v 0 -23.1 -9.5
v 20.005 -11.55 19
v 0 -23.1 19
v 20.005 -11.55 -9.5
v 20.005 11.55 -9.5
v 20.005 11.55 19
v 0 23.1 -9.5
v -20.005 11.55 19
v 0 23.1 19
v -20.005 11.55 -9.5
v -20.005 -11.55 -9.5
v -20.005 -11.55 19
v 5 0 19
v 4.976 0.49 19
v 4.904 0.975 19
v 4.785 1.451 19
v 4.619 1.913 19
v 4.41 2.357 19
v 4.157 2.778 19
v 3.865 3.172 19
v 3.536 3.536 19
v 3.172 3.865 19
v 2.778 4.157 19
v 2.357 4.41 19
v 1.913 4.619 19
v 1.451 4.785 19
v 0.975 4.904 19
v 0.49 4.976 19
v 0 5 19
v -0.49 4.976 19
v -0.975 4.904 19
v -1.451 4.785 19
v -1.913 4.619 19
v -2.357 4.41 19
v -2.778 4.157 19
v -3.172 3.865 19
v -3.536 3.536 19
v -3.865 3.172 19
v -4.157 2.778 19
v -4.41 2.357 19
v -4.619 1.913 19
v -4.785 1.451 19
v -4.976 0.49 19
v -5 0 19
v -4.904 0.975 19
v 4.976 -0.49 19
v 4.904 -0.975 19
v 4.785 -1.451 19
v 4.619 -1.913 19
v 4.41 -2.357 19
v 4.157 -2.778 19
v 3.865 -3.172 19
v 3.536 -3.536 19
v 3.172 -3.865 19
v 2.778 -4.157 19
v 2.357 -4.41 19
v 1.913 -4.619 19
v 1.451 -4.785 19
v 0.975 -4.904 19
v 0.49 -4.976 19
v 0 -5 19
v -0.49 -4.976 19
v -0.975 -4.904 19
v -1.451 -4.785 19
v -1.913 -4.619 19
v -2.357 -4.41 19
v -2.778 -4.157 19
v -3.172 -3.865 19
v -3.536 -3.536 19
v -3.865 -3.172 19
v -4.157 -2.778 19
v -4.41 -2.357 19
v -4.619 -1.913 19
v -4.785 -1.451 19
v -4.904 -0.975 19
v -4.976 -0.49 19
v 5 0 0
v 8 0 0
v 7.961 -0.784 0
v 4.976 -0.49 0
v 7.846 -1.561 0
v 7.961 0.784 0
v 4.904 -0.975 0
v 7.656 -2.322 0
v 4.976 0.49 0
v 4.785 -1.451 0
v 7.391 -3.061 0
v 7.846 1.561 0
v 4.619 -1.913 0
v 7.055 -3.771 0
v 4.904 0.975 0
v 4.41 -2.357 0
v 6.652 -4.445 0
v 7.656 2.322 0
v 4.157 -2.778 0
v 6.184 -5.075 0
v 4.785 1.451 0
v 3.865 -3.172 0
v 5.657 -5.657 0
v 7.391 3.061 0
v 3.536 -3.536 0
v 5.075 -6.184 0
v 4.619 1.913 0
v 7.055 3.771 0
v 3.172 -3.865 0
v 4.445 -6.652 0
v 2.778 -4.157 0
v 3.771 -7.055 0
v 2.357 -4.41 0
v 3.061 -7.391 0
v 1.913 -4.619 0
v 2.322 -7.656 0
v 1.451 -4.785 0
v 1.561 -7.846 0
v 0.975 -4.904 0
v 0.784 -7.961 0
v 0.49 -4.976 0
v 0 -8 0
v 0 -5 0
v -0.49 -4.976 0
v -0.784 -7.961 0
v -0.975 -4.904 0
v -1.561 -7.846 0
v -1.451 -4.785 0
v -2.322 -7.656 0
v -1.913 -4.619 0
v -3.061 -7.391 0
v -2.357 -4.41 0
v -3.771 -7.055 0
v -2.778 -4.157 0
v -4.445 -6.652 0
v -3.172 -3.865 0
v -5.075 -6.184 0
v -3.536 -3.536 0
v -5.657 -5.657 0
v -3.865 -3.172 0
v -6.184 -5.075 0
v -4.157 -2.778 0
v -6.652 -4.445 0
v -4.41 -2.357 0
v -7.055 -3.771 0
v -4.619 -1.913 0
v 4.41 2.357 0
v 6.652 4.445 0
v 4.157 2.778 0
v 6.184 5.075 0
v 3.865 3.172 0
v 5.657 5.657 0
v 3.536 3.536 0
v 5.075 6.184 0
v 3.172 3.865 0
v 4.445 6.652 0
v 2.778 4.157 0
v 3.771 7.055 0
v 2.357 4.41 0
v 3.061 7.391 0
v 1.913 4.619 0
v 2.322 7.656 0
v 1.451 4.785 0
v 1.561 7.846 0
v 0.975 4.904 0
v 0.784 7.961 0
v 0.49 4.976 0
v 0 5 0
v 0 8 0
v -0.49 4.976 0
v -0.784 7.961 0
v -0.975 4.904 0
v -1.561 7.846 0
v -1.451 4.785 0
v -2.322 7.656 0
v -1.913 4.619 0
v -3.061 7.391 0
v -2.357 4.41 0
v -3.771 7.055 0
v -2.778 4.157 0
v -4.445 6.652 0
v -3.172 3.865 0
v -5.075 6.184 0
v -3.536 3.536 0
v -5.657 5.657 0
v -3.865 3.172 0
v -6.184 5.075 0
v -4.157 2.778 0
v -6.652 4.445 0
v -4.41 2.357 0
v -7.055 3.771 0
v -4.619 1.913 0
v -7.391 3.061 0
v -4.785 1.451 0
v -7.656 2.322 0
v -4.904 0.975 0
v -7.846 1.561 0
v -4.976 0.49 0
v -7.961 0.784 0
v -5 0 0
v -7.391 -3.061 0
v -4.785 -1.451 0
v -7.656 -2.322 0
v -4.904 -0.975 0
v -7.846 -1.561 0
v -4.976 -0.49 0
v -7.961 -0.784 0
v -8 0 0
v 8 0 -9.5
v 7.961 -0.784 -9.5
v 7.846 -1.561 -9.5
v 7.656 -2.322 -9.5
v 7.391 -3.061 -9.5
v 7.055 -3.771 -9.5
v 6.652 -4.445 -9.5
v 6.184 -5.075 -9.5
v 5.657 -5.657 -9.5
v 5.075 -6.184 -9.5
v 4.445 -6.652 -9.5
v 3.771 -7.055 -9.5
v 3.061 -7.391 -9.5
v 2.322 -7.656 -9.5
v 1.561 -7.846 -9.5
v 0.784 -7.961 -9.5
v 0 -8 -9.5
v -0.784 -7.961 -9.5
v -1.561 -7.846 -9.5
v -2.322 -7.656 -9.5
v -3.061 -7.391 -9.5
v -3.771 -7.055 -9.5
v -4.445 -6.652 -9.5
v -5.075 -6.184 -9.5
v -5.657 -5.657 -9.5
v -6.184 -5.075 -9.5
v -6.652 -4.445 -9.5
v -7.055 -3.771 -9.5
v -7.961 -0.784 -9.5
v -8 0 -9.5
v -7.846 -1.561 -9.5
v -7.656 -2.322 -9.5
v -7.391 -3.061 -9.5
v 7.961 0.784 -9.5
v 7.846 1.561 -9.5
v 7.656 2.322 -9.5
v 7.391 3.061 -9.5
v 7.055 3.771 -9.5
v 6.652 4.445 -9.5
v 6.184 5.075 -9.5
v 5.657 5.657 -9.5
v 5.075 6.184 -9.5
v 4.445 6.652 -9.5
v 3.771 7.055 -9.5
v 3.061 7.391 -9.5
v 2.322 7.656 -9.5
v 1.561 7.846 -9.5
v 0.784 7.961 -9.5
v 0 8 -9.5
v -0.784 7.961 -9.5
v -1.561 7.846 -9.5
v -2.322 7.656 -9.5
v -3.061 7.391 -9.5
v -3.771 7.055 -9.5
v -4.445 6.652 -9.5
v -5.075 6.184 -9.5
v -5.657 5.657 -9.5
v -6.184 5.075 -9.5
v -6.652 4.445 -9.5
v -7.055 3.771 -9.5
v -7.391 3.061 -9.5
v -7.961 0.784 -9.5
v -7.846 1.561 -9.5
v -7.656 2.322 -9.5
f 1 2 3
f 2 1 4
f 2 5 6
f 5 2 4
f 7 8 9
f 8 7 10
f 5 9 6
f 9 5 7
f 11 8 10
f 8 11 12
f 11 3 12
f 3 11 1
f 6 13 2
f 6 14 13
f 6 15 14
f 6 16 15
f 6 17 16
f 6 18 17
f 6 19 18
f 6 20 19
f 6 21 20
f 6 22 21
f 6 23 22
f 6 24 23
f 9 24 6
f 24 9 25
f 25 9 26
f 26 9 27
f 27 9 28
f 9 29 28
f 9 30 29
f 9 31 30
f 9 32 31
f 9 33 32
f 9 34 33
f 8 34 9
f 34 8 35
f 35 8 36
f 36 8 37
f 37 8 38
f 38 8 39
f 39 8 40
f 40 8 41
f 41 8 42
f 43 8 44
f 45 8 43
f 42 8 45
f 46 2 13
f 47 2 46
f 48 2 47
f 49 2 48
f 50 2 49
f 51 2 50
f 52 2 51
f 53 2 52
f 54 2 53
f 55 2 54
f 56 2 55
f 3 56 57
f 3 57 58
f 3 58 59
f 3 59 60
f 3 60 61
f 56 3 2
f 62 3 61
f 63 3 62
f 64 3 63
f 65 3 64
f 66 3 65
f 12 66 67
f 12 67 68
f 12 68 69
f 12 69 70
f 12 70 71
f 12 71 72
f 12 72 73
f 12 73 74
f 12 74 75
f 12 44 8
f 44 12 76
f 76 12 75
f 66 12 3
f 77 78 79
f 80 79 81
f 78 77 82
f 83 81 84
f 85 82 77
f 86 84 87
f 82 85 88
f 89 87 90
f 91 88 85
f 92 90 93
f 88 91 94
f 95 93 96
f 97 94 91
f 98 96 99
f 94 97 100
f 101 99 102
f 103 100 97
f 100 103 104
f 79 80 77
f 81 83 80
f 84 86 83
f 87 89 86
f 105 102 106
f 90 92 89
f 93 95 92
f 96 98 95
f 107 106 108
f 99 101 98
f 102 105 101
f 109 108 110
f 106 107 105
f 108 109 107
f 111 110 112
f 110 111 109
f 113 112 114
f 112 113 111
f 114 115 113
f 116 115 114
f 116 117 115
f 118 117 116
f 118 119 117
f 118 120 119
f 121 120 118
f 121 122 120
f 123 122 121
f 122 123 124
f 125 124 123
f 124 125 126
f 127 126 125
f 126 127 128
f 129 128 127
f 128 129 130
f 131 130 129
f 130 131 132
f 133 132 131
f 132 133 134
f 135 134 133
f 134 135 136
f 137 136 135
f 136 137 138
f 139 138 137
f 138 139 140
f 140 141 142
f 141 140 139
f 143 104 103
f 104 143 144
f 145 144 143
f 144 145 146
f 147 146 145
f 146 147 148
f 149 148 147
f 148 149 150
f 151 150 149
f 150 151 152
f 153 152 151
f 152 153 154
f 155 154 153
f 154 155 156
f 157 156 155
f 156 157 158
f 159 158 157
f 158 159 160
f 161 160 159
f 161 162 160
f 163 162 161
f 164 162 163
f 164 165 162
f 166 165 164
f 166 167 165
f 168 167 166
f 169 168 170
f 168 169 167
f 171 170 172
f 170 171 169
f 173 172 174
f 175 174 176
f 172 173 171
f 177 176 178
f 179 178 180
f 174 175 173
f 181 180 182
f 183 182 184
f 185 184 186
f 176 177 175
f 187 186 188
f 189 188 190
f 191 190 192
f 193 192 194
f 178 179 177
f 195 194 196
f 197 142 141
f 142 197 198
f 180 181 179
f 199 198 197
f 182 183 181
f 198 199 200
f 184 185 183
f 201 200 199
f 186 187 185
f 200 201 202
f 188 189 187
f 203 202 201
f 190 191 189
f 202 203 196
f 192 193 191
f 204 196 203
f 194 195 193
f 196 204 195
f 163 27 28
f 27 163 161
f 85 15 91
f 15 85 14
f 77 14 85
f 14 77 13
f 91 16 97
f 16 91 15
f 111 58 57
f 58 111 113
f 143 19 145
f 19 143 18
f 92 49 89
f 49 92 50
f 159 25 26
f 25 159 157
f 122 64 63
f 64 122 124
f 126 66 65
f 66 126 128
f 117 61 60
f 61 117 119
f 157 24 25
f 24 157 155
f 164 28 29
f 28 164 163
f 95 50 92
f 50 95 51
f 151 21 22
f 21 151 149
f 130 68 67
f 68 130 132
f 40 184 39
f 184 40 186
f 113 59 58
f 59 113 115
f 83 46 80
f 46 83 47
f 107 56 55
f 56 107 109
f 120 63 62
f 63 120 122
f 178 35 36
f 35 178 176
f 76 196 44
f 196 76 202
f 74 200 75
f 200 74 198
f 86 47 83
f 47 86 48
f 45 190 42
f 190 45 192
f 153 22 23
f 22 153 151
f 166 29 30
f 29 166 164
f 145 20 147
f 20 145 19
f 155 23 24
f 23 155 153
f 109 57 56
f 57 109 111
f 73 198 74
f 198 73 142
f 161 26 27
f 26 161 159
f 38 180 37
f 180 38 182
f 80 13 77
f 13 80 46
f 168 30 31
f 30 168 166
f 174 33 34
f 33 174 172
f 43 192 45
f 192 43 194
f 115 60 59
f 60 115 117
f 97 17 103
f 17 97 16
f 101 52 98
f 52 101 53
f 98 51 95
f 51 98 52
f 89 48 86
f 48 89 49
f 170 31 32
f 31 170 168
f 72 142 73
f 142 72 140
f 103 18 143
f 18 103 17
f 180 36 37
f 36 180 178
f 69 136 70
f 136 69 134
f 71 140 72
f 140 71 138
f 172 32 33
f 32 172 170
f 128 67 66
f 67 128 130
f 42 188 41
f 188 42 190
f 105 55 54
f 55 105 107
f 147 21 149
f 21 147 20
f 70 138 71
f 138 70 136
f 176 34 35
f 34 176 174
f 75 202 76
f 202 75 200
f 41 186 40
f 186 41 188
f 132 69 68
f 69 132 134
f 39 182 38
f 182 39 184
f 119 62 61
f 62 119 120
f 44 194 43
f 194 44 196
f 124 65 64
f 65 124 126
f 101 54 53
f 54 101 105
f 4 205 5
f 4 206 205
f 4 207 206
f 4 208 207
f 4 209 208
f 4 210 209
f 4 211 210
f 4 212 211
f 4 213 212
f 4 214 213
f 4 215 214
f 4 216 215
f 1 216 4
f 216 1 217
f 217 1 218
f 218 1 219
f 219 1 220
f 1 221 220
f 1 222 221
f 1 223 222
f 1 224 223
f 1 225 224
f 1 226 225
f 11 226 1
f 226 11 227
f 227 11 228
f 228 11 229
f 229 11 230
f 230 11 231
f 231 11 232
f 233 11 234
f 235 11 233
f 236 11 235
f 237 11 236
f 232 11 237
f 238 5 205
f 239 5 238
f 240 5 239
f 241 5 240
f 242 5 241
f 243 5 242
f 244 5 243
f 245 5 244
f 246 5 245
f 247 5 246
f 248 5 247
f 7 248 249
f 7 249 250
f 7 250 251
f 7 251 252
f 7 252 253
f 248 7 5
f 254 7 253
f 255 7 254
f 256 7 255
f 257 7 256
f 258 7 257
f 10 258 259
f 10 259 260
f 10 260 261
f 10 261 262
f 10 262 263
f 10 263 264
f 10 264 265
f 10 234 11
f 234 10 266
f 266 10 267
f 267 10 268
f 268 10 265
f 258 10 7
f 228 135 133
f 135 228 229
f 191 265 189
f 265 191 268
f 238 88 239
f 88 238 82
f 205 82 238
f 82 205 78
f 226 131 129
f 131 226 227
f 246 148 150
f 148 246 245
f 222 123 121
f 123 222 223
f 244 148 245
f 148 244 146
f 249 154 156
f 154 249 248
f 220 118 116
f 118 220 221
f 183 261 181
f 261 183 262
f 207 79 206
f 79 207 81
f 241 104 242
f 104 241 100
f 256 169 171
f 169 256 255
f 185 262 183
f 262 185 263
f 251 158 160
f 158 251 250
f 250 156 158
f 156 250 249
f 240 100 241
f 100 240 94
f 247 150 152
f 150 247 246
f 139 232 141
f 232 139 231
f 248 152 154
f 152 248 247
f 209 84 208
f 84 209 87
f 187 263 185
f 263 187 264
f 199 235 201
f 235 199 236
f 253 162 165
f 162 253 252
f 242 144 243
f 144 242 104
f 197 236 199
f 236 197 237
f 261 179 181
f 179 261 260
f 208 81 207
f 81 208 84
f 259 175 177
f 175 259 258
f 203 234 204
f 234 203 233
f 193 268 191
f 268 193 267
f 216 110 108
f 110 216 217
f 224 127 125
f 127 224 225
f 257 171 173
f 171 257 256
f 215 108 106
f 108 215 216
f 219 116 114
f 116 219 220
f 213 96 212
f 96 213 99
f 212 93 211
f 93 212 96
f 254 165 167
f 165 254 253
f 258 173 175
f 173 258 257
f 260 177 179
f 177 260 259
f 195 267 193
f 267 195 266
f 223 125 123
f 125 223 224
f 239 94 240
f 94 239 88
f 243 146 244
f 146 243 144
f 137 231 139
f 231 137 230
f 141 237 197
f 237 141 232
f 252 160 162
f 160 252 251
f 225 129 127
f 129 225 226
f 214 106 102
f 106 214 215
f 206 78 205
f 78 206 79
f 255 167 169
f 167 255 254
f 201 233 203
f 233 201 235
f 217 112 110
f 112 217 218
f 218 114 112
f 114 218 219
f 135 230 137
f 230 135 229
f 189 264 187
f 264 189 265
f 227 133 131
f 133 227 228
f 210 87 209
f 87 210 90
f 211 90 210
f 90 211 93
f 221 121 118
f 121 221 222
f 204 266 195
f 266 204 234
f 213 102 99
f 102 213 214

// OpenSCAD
module hex_plate() {
    difference() {
        // Hexagonal block
        scale([1, 1, 0.5])
            rotate([0, 0, 30])
                cylinder(r=23.1, h=38.0, $fn=6);
        
        // Central circular through-hole
        translate([0, 0, -1])
            cylinder(r=5, h=40, $fn=64);
        
        // Rectangular steps/notches around the perimeter
        for (i = [0:5]) {
            rotate([0, 0, i * 60])
                translate([23.1, 0, 0])
                    cube([5, 10, 38], center=true);
        }
    }
}

module top_cutout() {
    // Asymmetric cutout on the top face
    translate([0, 0, 9.5])
        difference() {
            scale([1, 1, 0.25])
                rotate([0, 0, 30])
                    cylinder(r=23.1, h=38.0, $fn=6);
            translate([0, 0, -1])
                cylinder(r=10, h=40, $fn=64);
        }
}

module bottom_cutout() {
    // Asymmetric cutout on the bottom face
    translate([0, 0, -9.5])
        difference() {
            scale([1, 1, 0.25])
                rotate([0, 0, 30])
                    cylinder(r=23.1, h=38.0, $fn=6);
            translate([0, 0, -1])
                cylinder(r=8, h=40, $fn=64);
        }
}

union() {
    hex_plate();
    top_cutout();
    bottom_cutout();
}
